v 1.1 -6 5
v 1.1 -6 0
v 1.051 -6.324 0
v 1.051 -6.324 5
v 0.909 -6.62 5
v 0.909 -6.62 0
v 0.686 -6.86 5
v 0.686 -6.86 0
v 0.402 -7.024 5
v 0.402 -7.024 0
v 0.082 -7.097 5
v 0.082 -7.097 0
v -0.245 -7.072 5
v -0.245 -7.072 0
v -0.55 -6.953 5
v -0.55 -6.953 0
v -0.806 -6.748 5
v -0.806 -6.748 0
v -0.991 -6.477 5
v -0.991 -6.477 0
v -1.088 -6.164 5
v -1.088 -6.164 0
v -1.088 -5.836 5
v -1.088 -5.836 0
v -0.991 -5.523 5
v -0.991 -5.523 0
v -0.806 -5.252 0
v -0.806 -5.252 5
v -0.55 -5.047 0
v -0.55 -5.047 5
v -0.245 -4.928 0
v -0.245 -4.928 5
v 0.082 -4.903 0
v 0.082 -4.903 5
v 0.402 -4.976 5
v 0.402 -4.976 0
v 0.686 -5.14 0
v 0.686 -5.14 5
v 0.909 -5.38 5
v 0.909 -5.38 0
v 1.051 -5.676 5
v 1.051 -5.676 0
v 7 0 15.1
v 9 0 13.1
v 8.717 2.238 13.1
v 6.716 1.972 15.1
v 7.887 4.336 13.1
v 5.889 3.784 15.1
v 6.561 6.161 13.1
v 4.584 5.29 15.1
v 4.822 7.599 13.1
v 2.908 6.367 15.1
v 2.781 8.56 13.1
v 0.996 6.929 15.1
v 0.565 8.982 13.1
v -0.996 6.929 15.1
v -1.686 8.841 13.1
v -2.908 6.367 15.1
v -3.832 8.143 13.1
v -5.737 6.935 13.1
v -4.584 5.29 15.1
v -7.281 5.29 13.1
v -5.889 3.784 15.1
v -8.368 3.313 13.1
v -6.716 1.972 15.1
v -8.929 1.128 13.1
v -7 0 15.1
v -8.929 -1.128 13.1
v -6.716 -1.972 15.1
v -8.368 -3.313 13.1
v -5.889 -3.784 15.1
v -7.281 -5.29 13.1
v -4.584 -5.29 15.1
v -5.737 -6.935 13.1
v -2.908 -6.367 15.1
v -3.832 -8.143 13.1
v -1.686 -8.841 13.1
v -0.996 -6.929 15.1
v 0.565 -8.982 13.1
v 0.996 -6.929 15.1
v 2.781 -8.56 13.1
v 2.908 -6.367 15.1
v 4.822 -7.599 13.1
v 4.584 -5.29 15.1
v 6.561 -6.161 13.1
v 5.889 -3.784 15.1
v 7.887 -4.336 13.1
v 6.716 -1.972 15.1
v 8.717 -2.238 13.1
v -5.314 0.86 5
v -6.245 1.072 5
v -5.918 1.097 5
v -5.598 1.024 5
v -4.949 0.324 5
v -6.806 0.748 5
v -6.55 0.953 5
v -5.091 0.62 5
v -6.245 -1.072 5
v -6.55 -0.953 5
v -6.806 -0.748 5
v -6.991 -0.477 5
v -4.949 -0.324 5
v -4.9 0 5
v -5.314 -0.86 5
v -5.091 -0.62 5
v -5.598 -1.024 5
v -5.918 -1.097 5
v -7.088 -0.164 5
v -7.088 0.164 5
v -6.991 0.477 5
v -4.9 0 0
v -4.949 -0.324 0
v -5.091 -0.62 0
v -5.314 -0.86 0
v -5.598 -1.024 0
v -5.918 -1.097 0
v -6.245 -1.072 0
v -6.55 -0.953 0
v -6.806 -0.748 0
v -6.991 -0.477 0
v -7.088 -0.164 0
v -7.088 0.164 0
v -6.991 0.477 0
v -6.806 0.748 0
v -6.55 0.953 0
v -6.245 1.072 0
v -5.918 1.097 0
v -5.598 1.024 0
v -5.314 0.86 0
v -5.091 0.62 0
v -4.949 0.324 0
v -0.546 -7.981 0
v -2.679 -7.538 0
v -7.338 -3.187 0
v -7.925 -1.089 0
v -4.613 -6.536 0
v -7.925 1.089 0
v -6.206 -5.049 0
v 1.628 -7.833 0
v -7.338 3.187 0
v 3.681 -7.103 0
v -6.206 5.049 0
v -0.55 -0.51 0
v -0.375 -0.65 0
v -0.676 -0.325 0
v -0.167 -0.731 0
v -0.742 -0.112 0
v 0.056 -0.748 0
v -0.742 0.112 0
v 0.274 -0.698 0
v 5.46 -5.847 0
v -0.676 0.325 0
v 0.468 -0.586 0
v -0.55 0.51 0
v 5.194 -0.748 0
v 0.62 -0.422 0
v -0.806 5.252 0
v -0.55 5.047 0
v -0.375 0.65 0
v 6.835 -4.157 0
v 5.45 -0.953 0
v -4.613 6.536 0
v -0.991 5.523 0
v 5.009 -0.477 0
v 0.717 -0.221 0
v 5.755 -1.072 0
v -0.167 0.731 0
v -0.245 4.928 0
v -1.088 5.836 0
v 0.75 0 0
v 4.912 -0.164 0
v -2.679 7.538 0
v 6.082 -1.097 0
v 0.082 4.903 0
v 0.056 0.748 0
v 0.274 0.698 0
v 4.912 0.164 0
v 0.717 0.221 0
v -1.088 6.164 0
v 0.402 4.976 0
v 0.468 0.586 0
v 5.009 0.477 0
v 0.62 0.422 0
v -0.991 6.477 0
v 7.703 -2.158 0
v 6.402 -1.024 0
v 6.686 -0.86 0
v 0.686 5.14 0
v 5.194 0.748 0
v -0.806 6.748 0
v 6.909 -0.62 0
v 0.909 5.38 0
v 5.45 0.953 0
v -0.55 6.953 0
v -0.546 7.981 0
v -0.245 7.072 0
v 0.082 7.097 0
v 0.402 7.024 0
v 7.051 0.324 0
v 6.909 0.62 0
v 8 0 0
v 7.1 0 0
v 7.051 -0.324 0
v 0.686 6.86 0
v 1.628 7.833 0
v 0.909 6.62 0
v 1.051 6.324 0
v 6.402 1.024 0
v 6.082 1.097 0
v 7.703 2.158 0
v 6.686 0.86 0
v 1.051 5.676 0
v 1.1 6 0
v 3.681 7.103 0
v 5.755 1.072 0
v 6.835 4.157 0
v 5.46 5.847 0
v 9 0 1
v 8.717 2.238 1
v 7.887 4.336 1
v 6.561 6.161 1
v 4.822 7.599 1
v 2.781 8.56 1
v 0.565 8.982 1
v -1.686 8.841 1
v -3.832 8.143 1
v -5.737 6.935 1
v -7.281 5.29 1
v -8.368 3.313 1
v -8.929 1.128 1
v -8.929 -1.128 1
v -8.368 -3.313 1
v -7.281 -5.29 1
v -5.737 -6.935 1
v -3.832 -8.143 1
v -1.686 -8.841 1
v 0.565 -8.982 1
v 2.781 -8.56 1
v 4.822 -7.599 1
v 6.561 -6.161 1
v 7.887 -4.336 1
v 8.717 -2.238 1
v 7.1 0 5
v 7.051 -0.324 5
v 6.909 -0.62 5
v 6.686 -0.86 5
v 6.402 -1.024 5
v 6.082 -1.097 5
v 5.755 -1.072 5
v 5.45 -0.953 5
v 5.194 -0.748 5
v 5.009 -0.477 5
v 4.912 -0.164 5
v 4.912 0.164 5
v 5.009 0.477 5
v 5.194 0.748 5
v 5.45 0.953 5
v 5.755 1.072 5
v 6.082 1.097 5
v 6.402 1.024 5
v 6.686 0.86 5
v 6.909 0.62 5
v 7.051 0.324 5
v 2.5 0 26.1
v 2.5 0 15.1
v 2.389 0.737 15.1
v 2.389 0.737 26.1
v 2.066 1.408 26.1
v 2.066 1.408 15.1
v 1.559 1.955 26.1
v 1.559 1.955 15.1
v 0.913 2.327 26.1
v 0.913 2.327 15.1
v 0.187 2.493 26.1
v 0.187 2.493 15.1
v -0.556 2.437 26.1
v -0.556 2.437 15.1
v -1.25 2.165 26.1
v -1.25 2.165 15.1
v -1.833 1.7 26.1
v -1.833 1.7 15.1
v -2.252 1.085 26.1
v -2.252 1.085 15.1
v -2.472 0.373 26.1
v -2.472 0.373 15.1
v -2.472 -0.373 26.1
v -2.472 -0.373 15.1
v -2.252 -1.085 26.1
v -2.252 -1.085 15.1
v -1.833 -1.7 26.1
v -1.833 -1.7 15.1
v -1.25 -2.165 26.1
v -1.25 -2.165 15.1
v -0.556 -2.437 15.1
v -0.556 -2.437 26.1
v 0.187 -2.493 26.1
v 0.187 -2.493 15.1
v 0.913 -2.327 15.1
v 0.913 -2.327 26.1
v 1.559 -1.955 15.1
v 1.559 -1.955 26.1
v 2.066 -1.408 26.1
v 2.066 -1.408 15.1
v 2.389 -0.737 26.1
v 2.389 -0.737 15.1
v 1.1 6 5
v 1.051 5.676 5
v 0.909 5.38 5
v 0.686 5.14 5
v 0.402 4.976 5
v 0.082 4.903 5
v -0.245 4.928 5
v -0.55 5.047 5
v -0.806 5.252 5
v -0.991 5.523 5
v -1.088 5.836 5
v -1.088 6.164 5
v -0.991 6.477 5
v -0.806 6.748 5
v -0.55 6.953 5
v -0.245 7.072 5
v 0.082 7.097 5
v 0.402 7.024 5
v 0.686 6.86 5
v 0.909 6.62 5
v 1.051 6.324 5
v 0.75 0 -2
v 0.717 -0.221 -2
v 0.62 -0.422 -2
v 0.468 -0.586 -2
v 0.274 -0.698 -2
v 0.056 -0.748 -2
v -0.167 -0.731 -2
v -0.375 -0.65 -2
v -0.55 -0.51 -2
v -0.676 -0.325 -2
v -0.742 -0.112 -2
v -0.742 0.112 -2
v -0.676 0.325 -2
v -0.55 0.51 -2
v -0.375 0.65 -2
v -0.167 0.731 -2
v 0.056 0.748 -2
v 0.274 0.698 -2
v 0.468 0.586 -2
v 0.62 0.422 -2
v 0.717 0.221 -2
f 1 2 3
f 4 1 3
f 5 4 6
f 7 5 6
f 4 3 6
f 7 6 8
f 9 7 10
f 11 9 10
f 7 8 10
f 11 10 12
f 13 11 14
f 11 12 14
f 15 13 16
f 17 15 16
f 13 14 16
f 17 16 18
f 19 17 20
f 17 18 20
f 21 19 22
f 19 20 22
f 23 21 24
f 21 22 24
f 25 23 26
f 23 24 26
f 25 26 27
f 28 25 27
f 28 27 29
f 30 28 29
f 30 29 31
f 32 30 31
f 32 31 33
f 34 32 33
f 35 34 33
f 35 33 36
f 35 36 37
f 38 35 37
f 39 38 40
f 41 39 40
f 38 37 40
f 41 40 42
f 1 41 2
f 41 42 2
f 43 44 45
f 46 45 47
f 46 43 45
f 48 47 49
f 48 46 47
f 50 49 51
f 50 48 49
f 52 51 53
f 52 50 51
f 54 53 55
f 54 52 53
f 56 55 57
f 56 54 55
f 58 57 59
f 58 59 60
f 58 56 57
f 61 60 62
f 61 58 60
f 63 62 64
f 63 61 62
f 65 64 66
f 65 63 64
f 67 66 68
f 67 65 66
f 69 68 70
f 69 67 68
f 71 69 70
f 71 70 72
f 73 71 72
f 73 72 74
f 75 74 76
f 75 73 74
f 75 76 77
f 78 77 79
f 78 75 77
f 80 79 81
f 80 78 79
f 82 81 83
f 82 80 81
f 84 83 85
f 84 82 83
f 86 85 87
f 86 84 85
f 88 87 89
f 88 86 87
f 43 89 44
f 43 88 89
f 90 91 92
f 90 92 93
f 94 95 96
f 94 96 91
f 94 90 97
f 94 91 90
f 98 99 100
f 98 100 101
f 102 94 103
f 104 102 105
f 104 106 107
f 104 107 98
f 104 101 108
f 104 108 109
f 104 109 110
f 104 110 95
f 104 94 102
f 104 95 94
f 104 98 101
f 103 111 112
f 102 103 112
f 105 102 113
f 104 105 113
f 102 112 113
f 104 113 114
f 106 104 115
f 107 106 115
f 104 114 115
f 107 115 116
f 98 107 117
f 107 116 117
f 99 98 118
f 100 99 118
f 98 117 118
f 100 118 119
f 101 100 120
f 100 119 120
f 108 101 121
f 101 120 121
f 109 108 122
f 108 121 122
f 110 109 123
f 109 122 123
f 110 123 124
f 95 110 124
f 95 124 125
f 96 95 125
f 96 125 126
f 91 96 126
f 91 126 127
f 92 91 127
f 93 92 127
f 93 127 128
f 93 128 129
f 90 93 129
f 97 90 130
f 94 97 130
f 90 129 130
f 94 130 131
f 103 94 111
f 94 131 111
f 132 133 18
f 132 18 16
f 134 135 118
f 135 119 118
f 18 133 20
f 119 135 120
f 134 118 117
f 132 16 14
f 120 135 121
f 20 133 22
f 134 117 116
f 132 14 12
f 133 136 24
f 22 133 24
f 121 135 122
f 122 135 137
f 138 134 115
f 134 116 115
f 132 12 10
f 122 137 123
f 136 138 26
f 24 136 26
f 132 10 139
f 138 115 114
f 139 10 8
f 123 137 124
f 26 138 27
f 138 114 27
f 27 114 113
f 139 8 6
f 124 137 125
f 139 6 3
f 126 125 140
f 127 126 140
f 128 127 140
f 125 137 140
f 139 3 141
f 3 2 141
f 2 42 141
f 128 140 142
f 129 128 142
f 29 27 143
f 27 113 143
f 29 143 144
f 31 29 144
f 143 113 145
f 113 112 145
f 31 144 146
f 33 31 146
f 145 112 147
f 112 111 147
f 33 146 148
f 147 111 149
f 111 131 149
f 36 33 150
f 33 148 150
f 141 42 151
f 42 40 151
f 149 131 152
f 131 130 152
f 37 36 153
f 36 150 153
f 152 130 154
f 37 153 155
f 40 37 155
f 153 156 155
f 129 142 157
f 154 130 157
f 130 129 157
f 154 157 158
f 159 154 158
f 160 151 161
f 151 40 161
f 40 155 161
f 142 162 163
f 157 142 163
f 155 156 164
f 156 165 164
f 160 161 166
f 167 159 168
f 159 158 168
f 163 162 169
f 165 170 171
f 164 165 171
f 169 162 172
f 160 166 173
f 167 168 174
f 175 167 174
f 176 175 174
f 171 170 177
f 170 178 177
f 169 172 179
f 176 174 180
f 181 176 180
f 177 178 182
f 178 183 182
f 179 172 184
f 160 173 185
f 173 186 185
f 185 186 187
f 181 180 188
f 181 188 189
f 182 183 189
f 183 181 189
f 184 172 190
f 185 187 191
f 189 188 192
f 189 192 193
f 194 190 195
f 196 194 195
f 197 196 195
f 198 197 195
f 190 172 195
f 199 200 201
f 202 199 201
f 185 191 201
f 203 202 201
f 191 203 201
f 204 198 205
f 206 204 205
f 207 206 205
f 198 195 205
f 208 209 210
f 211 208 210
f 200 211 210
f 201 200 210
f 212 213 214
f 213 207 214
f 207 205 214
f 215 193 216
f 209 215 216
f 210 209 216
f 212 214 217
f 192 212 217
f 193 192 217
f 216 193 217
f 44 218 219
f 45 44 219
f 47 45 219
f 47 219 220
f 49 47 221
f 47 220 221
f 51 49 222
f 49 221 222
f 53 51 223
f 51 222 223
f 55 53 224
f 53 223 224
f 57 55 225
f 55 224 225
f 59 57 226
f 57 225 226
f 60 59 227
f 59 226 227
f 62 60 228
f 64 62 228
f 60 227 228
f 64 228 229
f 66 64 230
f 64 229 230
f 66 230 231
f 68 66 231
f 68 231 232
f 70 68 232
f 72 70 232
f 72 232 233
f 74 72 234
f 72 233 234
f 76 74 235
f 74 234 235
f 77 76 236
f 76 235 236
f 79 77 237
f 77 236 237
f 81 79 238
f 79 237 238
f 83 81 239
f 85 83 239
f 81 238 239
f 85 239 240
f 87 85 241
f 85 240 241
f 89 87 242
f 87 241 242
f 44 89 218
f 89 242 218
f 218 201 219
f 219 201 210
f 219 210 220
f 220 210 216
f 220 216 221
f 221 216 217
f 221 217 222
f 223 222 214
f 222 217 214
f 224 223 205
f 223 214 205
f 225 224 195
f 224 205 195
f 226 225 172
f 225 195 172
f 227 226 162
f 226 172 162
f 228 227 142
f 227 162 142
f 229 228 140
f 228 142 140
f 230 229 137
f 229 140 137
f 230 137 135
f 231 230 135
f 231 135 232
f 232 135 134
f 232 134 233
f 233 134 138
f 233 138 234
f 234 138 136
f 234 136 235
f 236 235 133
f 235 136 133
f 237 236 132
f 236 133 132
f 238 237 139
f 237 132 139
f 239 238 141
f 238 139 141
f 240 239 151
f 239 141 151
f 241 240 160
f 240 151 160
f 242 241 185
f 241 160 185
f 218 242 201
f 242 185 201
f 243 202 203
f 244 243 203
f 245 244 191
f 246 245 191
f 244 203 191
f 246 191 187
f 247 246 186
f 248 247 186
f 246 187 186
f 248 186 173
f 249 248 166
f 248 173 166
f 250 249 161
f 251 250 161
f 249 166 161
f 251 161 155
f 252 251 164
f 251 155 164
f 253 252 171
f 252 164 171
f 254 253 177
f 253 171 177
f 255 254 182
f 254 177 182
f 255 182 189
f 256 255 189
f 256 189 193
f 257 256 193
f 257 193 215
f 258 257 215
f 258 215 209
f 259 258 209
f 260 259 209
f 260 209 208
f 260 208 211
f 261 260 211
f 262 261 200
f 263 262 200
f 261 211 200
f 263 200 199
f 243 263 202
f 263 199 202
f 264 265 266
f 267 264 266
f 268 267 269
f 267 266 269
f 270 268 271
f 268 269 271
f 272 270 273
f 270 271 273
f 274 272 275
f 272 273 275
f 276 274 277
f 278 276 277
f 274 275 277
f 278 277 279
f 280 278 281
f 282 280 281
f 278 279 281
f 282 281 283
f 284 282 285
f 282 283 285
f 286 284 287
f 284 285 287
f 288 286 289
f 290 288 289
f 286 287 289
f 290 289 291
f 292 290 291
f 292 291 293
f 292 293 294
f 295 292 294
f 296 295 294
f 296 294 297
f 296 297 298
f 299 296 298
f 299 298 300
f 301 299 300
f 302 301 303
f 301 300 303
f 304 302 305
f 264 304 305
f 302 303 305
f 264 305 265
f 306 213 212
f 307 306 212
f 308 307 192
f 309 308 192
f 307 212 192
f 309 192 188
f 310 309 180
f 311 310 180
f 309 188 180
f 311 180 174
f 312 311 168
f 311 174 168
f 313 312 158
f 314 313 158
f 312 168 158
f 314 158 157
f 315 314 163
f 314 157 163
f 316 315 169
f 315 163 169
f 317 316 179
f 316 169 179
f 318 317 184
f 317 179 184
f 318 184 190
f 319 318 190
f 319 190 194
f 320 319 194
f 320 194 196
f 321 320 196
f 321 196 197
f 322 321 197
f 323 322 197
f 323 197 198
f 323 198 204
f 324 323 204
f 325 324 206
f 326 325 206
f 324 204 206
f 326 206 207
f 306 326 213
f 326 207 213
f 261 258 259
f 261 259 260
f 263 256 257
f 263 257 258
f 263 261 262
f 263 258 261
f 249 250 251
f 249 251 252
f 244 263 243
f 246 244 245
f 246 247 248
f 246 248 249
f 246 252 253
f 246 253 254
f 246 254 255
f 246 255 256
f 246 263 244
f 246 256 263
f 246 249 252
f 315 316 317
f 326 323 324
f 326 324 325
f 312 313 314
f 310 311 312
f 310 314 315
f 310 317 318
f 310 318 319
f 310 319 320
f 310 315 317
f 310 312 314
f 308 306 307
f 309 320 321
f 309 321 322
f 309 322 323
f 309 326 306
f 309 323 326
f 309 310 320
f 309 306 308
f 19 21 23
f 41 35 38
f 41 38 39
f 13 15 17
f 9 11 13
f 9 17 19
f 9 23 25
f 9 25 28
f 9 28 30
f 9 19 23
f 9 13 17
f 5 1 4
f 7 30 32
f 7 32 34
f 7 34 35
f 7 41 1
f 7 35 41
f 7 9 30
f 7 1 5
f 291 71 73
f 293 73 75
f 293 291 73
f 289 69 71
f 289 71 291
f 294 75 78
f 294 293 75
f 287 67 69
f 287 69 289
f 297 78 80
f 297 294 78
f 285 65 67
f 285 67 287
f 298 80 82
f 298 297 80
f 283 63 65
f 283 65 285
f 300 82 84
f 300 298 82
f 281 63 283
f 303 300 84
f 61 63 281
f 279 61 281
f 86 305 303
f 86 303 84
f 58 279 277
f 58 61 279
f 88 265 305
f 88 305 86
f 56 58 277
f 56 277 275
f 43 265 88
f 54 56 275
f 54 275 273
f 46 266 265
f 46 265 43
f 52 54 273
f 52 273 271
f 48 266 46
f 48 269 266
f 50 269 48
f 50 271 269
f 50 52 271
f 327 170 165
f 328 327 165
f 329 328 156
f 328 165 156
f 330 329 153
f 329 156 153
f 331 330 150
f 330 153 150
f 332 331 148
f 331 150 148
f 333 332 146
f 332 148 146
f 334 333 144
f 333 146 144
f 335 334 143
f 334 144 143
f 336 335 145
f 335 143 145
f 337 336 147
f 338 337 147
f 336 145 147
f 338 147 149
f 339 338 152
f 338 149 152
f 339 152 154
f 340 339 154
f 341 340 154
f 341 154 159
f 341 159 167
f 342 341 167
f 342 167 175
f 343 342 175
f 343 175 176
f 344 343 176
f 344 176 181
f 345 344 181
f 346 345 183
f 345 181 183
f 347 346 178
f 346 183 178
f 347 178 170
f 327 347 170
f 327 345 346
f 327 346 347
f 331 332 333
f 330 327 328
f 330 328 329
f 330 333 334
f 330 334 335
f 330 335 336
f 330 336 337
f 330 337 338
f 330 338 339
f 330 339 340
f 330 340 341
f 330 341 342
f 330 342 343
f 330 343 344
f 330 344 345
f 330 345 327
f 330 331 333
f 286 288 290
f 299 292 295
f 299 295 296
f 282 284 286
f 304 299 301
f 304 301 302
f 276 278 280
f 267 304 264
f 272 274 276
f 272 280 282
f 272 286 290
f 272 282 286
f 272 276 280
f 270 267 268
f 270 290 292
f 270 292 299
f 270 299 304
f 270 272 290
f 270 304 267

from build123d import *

# Parameters (mm, degrees)
F0_R     = 9
F1_DEPTH = 15.1
F2_SIZE  = 2
F3_SIZE  = 1
F4_R     = 1.1
F5_DEPTH = 5
F6_R     = 2.5
F7_DEPTH = 11
F8_R     = 0.75
F9_DEPTH = 2


with BuildPart() as f1:
    # F0 (on Top) → F1 (new body)
    with BuildSketch(Plane.XY):
        Circle(F0_R)
    extrude(amount=F1_DEPTH)

    # F2
    f2_edges = [f1.edges().sort_by_distance(p)[0] for p in [
        (-9, 0, 15.1),
    ]]
    chamfer(f2_edges, length=F2_SIZE)

    # F3
    f3_edges = [f1.edges().sort_by_distance(p)[0] for p in [
        (-9, 0, 0),
    ]]
    chamfer(f3_edges, length=F3_SIZE)

    # F4 (on face) → F5 (cut)
    with BuildSketch(Plane(origin=(0, 0, 0), x_dir=(1, 0, 0), z_dir=(0, 0, -1))):
        with Locations((0, 6)):
            Circle(F4_R)
        with Locations((-6, 0)):
            Circle(F4_R)
        with Locations((0, -6)):
            Circle(F4_R)
        with Locations((6, 0)):
            Circle(F4_R)
    extrude(amount=-F5_DEPTH, mode=Mode.SUBTRACT)

    # F6 (on face) → F7 (join)
    with BuildSketch(Plane.XY.offset(15.1)):
        Circle(F6_R)
    extrude(amount=F7_DEPTH)

    # F8 (on face) → F9 (join)
    with BuildSketch(Plane(origin=(0, 0, 0), x_dir=(1, 0, 0), z_dir=(0, 0, -1))):
        Circle(F8_R)
    extrude(amount=F9_DEPTH)


solid = f1.part
